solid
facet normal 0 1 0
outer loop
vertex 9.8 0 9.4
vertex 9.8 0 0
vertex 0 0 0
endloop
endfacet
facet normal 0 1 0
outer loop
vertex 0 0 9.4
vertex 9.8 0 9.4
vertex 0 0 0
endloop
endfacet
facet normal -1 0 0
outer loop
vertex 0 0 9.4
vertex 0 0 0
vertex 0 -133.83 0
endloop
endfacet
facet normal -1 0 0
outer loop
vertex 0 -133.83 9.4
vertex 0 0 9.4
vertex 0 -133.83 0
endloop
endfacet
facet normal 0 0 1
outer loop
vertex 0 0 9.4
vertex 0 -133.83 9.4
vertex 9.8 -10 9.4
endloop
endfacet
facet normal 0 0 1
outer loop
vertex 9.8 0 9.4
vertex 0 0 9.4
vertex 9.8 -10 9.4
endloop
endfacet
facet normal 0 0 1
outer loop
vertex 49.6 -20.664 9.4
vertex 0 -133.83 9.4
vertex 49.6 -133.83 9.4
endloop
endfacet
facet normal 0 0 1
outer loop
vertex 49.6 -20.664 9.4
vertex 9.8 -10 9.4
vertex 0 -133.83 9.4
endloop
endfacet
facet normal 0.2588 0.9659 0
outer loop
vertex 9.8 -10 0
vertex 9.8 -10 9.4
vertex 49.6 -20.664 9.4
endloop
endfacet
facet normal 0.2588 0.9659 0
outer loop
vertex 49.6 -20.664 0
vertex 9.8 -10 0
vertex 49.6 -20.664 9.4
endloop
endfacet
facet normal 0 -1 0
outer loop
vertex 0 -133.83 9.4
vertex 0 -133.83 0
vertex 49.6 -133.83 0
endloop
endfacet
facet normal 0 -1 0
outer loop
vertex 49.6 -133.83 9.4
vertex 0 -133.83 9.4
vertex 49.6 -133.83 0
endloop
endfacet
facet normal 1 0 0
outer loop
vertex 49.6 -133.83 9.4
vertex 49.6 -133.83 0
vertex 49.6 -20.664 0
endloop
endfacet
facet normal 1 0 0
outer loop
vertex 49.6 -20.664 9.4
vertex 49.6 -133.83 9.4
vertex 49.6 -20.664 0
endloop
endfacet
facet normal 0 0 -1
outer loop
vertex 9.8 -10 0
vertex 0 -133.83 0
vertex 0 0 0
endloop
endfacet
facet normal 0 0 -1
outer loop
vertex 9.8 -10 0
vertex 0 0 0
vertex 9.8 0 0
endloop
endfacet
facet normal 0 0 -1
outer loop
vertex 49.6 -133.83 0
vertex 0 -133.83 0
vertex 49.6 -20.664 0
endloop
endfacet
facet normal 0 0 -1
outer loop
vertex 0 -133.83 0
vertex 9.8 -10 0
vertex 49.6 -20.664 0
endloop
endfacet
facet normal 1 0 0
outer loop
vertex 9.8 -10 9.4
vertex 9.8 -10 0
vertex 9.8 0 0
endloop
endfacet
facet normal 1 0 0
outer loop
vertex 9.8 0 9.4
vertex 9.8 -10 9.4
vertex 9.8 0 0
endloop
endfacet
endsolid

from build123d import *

# Parameters (mm, degrees)
EXTRUDE_1_DEPTH          = 9.4
CUT_EXTRUDE_1_DEPTH      = 1
CUT_EXTRUDE_1_DEPTH_BACK = 10.4


with BuildPart() as part:
    # 草图1 → 凸台-拉伸1 (new body)
    with BuildSketch(Plane.XY):
        Polygon((9.8, 0), (0, 0), (0, -133.83), (49.6, -133.83), (49.6, 0), (39.8, 0), (39.8, -10), (9.8, -10), align=None)
    extrude(amount=EXTRUDE_1_DEPTH)

    # 草图2 → 切除-拉伸1 (cut, two sides)
    with BuildSketch(Plane.XY.offset(9.4)) as cut_extrude_1_sk:
        Polygon((39.8, -10), (9.8, -10), (49.6, -20.664377859), (49.6, 0), (39.8, 0), align=None)
    extrude(amount=CUT_EXTRUDE_1_DEPTH, mode=Mode.SUBTRACT)
    extrude(cut_extrude_1_sk.sketch, amount=-CUT_EXTRUDE_1_DEPTH_BACK, mode=Mode.SUBTRACT)


solid = part.part
